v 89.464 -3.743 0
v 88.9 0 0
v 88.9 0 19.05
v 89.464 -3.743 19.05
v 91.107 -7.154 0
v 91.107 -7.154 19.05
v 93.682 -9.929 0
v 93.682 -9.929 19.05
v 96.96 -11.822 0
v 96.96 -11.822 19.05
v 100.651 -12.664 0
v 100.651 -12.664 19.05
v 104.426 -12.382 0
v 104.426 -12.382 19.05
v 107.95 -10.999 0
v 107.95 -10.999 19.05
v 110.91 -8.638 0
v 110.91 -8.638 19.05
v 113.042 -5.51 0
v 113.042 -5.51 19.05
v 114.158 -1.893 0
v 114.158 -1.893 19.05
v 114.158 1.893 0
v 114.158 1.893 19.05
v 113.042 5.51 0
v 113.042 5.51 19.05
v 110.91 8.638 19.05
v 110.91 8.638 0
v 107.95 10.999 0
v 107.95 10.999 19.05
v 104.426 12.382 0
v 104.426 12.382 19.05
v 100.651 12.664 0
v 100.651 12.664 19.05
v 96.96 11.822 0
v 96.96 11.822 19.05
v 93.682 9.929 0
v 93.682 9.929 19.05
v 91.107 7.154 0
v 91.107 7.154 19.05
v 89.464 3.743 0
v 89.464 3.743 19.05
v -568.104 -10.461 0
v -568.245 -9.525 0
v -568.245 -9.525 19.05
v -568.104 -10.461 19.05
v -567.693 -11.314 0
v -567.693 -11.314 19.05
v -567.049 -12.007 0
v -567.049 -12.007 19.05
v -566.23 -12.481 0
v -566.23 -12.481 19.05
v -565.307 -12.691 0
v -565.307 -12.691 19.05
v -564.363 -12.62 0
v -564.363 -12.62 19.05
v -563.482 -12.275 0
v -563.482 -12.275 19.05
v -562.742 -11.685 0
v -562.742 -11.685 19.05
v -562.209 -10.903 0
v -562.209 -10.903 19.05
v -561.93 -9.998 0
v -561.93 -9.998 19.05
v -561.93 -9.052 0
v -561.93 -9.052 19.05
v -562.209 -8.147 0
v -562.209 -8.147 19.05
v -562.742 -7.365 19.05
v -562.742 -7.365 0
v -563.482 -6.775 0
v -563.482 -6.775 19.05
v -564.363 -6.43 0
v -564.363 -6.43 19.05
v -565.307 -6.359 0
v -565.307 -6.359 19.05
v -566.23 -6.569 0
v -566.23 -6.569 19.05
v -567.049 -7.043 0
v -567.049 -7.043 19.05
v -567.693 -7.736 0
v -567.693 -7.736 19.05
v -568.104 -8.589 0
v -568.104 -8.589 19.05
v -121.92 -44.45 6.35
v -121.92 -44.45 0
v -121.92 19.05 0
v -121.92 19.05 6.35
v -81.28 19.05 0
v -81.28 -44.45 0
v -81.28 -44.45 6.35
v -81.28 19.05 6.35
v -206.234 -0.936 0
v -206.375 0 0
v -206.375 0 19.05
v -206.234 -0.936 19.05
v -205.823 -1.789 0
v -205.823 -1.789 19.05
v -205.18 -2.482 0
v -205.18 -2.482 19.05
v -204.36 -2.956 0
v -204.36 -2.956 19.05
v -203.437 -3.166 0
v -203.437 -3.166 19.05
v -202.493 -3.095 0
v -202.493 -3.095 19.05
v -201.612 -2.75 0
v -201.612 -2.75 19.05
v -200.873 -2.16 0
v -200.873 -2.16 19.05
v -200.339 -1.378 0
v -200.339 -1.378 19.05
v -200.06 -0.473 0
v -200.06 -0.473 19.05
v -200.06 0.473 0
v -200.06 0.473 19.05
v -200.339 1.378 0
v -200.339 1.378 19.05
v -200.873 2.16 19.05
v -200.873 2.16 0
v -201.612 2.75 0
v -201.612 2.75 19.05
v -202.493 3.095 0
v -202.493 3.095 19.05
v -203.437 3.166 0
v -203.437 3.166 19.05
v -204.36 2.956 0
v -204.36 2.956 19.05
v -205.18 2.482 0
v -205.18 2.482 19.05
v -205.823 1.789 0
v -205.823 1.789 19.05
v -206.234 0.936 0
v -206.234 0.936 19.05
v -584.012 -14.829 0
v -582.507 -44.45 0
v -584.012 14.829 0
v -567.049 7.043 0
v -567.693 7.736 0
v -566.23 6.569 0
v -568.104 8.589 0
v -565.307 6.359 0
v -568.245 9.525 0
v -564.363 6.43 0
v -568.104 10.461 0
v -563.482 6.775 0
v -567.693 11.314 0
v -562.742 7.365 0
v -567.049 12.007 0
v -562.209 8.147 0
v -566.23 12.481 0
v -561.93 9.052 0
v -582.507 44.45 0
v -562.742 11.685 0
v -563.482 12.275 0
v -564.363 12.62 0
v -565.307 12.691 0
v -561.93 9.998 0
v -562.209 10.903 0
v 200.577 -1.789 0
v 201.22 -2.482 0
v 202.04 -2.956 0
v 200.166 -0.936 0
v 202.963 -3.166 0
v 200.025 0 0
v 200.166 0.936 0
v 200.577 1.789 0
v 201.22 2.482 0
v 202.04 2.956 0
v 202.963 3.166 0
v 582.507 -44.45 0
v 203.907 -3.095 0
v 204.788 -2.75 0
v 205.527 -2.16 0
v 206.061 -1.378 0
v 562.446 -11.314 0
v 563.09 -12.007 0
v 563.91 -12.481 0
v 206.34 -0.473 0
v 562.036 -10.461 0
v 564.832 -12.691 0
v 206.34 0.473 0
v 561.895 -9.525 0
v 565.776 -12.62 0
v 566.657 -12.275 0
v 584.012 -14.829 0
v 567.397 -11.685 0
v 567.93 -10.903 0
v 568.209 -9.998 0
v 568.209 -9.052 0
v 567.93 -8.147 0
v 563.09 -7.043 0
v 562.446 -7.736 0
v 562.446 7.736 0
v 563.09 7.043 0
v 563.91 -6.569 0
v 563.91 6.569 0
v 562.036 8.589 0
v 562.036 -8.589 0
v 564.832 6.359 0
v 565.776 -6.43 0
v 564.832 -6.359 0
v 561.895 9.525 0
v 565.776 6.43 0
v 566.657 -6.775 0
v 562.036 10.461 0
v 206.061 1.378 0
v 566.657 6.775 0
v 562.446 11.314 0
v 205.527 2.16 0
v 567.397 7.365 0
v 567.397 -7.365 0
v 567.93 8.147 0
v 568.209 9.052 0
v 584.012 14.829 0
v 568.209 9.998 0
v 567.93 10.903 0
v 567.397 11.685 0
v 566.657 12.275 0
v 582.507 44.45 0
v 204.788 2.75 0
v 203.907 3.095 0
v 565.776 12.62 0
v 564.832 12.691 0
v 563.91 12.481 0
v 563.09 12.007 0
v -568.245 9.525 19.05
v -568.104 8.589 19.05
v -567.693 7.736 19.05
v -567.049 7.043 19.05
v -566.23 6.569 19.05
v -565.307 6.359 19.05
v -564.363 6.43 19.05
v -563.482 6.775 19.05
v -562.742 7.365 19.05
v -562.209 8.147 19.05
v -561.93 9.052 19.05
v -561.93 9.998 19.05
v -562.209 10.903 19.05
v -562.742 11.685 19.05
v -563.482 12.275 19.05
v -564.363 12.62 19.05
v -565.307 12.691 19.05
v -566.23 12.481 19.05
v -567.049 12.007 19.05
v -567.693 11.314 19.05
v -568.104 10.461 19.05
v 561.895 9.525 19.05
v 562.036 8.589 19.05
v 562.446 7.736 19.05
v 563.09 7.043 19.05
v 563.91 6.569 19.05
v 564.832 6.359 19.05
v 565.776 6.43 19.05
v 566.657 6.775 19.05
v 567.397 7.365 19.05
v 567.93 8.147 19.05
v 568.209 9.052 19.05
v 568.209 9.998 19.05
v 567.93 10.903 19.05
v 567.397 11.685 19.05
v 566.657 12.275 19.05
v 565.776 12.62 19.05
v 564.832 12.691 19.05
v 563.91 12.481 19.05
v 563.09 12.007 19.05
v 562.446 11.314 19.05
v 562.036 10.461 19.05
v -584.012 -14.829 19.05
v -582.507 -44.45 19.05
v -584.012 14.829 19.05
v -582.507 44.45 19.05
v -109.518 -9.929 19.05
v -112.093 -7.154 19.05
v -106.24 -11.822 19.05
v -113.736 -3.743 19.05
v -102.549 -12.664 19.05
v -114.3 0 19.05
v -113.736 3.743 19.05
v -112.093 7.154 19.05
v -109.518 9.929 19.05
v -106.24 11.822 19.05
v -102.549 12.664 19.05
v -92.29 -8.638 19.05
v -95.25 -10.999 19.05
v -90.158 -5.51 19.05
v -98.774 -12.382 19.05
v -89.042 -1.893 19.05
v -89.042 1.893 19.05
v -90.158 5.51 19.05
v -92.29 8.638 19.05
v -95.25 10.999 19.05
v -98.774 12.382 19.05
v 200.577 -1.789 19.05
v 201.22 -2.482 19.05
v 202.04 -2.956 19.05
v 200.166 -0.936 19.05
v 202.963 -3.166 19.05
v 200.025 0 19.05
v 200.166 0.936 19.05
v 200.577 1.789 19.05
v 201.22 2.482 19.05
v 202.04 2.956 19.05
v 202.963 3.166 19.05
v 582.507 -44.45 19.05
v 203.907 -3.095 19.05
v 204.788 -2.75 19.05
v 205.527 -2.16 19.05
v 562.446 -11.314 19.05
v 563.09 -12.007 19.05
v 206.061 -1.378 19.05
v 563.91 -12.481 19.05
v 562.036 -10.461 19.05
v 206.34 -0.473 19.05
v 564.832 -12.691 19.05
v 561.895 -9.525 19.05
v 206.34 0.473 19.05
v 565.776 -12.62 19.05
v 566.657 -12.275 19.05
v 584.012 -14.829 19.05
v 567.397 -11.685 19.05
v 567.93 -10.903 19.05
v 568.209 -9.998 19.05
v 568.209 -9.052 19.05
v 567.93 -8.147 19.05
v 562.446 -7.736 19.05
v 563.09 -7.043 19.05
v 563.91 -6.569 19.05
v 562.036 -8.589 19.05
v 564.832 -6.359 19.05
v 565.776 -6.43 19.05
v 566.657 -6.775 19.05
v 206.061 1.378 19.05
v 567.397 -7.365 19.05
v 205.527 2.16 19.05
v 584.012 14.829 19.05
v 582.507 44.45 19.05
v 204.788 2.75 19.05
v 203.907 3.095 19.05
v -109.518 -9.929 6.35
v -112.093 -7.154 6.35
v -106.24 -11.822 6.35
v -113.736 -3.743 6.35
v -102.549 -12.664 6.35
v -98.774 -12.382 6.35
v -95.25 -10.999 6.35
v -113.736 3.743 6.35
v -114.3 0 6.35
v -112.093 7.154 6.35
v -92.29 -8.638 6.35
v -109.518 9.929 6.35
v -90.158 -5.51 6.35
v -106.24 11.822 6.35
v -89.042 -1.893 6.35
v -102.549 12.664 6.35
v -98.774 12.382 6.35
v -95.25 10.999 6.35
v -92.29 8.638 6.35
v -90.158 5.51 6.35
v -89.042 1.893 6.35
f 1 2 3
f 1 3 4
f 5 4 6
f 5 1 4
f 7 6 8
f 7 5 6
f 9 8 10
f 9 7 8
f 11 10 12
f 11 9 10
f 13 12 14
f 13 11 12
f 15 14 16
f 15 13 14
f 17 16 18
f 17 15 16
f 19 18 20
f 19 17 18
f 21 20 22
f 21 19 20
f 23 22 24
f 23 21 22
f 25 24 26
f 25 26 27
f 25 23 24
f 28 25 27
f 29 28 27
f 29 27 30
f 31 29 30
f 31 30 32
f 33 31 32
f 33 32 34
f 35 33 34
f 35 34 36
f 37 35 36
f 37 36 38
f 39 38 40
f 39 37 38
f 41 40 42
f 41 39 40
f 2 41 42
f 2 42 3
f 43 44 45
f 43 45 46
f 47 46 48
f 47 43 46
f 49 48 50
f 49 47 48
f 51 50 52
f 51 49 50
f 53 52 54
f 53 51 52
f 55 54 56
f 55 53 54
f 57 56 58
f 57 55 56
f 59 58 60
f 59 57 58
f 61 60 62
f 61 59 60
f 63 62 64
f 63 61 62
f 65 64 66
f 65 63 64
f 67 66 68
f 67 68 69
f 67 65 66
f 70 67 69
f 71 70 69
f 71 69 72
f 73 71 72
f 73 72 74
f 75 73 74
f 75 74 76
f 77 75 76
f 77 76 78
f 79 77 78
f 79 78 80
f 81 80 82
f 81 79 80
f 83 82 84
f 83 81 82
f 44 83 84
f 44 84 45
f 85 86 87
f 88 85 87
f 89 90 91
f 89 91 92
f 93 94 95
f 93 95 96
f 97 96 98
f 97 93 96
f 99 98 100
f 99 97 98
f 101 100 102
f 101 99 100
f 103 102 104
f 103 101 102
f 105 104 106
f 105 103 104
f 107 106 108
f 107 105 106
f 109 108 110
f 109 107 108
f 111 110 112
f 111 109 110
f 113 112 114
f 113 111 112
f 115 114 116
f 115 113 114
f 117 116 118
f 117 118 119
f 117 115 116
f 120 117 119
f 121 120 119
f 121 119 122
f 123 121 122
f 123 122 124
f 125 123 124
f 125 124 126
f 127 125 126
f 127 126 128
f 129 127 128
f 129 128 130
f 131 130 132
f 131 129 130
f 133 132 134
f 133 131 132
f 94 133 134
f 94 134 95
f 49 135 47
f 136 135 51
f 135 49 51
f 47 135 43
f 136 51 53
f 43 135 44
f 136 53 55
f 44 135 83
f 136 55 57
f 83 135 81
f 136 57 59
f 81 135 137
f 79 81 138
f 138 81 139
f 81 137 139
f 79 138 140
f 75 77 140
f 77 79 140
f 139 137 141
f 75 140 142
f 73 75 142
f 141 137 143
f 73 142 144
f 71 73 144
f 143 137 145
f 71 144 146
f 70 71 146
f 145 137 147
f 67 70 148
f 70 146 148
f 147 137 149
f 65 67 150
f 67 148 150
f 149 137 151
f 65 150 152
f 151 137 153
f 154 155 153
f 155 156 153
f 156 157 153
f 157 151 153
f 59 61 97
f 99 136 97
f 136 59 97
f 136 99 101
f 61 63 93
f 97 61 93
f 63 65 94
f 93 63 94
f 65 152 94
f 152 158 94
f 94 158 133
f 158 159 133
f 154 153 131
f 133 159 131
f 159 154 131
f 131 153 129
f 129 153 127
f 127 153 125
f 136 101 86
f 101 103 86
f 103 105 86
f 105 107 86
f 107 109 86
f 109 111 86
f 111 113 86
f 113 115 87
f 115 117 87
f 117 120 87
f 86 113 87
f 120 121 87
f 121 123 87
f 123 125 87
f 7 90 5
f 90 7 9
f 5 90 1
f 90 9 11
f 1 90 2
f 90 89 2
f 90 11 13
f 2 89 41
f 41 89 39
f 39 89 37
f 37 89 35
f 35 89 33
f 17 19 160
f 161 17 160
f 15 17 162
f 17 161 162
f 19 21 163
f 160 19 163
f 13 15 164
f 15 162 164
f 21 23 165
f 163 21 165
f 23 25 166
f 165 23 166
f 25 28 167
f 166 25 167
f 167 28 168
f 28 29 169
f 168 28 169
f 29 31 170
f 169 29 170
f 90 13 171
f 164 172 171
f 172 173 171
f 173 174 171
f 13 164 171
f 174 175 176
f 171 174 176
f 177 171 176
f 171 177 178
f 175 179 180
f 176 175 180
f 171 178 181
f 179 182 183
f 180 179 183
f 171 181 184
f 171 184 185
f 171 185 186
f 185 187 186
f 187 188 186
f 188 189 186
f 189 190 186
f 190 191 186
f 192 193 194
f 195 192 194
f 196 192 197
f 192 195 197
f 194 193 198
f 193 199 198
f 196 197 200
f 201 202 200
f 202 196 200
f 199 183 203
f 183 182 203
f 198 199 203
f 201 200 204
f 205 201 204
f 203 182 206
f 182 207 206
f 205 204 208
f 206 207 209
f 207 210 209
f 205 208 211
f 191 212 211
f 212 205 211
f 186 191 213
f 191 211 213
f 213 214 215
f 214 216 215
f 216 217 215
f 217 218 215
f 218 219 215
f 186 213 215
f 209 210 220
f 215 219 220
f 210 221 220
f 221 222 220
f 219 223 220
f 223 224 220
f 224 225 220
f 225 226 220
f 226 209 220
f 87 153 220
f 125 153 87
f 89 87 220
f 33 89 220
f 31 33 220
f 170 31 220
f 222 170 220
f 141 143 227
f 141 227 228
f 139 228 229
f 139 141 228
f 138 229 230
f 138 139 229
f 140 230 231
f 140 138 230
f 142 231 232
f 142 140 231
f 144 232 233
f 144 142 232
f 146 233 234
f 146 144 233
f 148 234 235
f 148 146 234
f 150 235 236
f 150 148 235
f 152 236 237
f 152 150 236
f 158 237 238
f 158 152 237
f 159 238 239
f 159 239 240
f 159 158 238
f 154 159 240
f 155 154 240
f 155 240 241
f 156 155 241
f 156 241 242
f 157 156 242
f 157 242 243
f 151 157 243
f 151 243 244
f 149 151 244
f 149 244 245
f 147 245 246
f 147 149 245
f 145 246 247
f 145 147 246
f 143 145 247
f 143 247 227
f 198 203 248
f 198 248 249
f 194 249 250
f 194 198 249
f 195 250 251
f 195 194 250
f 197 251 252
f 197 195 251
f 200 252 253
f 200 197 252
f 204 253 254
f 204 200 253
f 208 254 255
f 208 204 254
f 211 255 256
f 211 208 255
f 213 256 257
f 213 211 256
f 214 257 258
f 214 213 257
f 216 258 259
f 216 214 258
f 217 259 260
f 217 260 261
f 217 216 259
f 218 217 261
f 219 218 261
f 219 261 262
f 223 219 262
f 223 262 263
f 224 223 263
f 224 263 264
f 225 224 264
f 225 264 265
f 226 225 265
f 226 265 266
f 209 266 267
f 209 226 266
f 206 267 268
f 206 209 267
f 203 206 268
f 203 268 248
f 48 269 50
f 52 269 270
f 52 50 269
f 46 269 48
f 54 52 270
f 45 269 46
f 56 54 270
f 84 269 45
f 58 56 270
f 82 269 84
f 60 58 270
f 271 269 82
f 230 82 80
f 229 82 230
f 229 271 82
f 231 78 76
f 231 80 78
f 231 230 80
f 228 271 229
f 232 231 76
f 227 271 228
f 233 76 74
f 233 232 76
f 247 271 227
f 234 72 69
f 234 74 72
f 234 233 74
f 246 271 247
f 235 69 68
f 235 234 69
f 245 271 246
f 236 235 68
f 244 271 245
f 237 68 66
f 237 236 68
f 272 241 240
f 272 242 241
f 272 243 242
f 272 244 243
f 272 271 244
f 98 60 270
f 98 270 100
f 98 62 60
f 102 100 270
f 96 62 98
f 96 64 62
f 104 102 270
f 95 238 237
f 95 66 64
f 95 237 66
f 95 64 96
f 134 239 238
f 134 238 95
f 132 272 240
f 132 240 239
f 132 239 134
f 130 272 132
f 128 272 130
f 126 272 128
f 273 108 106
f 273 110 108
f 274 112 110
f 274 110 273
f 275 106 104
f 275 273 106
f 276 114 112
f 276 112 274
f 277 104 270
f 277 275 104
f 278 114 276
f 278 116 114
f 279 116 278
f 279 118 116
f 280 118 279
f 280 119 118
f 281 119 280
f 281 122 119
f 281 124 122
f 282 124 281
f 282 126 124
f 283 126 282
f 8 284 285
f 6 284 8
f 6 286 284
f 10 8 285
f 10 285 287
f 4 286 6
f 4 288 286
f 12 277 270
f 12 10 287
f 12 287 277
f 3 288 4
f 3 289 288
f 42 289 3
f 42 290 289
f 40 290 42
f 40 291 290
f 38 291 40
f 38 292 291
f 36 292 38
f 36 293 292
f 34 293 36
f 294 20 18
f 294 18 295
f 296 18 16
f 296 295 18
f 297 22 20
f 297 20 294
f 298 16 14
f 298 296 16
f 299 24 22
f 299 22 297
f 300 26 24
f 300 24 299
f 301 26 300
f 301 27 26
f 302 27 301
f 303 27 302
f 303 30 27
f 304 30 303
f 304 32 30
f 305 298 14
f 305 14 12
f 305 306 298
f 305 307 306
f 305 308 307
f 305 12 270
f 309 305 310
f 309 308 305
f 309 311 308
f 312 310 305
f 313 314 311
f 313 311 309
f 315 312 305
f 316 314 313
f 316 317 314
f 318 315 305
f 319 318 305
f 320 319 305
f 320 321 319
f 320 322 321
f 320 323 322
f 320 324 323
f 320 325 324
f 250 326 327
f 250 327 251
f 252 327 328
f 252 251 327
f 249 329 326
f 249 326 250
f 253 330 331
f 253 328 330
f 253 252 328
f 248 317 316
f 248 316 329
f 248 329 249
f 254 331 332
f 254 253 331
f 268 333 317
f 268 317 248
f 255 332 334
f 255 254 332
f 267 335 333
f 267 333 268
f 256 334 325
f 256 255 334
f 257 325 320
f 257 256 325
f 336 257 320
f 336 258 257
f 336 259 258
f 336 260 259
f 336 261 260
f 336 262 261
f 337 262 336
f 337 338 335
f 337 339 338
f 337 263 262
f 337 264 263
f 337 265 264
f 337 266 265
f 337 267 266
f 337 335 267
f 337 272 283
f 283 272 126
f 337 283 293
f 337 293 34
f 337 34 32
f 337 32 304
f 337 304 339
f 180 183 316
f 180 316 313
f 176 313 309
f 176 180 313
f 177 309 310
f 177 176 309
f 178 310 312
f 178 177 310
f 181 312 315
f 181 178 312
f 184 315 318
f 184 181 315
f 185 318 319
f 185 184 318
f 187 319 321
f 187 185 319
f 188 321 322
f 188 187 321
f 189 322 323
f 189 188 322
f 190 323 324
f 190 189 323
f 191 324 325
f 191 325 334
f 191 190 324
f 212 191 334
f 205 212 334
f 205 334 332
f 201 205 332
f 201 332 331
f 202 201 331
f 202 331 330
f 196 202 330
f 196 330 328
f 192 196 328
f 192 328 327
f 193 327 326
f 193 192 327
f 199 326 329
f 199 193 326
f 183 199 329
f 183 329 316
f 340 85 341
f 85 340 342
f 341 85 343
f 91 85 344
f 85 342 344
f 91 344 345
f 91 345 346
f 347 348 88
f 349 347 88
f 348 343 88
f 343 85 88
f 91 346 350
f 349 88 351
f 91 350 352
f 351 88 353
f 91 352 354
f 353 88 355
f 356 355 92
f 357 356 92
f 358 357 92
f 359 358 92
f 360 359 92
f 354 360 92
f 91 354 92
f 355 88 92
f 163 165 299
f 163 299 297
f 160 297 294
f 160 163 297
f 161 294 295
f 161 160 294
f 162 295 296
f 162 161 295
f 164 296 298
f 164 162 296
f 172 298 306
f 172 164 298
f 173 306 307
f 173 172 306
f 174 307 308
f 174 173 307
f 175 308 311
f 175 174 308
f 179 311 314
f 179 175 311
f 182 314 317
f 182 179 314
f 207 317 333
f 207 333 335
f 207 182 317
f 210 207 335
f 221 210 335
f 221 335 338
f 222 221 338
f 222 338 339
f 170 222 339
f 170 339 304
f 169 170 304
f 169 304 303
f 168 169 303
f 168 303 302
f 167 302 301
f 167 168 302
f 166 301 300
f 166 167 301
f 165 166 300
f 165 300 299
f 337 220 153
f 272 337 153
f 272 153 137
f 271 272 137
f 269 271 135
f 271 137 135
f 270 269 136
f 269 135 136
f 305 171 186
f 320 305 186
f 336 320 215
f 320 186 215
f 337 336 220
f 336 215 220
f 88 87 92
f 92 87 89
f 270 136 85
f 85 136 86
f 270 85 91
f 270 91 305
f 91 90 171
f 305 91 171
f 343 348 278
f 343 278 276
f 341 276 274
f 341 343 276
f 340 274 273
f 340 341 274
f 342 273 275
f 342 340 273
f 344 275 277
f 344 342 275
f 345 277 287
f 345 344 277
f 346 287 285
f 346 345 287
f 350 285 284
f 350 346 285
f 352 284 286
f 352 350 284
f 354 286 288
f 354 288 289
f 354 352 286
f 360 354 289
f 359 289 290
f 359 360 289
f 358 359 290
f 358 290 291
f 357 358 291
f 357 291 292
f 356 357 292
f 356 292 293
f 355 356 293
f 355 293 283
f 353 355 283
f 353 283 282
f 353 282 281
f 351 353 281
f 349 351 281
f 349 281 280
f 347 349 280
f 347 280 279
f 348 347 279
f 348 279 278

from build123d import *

# Parameters (mm, degrees)
SKETCH1_R           = 12.7
SKETCH1_R_2         = 3.175
BOSS_EXTRUDE2_DEPTH = 19.05
SKETCH2_W           = 40.64
SKETCH2_H           = 127
CUT_EXTRUDE1_DEPTH  = 6.35


with BuildPart() as part:
    # Sketch1 → Boss-Extrude2 (new body)
    with BuildSketch(Plane.XY):
        with BuildLine():
            Line((582.506512839, 44.45), (-582.506512839, 44.45))
            ThreePointArc((-582.506512839, 44.45), (-584.2, 0), (-582.506512839, -44.45))
            Line((-582.506512839, -44.45), (582.506512839, -44.45))
            ThreePointArc((582.506512839, -44.45), (584.2, 0), (582.506512839, 44.45))
        make_face()
        with Locations(Location((101.6, 0, 0), (0, 0, 180))):
            Circle(SKETCH1_R, mode=Mode.SUBTRACT)
        with Locations(Location((-565.069727445, 9.525, 0), (0, 0, 180))):
            Circle(SKETCH1_R_2, mode=Mode.SUBTRACT)
        with Locations(Location((-565.069727445, -9.525, 0), (0, 0, 180))):
            Circle(SKETCH1_R_2, mode=Mode.SUBTRACT)
        with Locations(Location((565.069727445, -9.525, 0), (0, 0, 180))):
            Circle(SKETCH1_R_2, mode=Mode.SUBTRACT)
        with Locations(Location((565.069727445, 9.525, 0), (0, 0, 180))):
            Circle(SKETCH1_R_2, mode=Mode.SUBTRACT)
        with Locations(Location((-101.6, 0, 0), (0, 0, 180))):
            Circle(SKETCH1_R, mode=Mode.SUBTRACT)
        with Locations(Location((-203.2, 0, 0), (0, 0, 180))):
            Circle(SKETCH1_R_2, mode=Mode.SUBTRACT)
        with Locations(Location((203.2, 0, 0), (0, 0, 180))):
            Circle(SKETCH1_R_2, mode=Mode.SUBTRACT)
    extrude(amount=BOSS_EXTRUDE2_DEPTH)

    # Sketch2 → Cut-Extrude1 (cut)
    with BuildSketch(Plane.XY):
        with Locations((-101.6, -44.45)):
            Rectangle(SKETCH2_W, SKETCH2_H)
    extrude(amount=CUT_EXTRUDE1_DEPTH, mode=Mode.SUBTRACT)


solid = part.part
